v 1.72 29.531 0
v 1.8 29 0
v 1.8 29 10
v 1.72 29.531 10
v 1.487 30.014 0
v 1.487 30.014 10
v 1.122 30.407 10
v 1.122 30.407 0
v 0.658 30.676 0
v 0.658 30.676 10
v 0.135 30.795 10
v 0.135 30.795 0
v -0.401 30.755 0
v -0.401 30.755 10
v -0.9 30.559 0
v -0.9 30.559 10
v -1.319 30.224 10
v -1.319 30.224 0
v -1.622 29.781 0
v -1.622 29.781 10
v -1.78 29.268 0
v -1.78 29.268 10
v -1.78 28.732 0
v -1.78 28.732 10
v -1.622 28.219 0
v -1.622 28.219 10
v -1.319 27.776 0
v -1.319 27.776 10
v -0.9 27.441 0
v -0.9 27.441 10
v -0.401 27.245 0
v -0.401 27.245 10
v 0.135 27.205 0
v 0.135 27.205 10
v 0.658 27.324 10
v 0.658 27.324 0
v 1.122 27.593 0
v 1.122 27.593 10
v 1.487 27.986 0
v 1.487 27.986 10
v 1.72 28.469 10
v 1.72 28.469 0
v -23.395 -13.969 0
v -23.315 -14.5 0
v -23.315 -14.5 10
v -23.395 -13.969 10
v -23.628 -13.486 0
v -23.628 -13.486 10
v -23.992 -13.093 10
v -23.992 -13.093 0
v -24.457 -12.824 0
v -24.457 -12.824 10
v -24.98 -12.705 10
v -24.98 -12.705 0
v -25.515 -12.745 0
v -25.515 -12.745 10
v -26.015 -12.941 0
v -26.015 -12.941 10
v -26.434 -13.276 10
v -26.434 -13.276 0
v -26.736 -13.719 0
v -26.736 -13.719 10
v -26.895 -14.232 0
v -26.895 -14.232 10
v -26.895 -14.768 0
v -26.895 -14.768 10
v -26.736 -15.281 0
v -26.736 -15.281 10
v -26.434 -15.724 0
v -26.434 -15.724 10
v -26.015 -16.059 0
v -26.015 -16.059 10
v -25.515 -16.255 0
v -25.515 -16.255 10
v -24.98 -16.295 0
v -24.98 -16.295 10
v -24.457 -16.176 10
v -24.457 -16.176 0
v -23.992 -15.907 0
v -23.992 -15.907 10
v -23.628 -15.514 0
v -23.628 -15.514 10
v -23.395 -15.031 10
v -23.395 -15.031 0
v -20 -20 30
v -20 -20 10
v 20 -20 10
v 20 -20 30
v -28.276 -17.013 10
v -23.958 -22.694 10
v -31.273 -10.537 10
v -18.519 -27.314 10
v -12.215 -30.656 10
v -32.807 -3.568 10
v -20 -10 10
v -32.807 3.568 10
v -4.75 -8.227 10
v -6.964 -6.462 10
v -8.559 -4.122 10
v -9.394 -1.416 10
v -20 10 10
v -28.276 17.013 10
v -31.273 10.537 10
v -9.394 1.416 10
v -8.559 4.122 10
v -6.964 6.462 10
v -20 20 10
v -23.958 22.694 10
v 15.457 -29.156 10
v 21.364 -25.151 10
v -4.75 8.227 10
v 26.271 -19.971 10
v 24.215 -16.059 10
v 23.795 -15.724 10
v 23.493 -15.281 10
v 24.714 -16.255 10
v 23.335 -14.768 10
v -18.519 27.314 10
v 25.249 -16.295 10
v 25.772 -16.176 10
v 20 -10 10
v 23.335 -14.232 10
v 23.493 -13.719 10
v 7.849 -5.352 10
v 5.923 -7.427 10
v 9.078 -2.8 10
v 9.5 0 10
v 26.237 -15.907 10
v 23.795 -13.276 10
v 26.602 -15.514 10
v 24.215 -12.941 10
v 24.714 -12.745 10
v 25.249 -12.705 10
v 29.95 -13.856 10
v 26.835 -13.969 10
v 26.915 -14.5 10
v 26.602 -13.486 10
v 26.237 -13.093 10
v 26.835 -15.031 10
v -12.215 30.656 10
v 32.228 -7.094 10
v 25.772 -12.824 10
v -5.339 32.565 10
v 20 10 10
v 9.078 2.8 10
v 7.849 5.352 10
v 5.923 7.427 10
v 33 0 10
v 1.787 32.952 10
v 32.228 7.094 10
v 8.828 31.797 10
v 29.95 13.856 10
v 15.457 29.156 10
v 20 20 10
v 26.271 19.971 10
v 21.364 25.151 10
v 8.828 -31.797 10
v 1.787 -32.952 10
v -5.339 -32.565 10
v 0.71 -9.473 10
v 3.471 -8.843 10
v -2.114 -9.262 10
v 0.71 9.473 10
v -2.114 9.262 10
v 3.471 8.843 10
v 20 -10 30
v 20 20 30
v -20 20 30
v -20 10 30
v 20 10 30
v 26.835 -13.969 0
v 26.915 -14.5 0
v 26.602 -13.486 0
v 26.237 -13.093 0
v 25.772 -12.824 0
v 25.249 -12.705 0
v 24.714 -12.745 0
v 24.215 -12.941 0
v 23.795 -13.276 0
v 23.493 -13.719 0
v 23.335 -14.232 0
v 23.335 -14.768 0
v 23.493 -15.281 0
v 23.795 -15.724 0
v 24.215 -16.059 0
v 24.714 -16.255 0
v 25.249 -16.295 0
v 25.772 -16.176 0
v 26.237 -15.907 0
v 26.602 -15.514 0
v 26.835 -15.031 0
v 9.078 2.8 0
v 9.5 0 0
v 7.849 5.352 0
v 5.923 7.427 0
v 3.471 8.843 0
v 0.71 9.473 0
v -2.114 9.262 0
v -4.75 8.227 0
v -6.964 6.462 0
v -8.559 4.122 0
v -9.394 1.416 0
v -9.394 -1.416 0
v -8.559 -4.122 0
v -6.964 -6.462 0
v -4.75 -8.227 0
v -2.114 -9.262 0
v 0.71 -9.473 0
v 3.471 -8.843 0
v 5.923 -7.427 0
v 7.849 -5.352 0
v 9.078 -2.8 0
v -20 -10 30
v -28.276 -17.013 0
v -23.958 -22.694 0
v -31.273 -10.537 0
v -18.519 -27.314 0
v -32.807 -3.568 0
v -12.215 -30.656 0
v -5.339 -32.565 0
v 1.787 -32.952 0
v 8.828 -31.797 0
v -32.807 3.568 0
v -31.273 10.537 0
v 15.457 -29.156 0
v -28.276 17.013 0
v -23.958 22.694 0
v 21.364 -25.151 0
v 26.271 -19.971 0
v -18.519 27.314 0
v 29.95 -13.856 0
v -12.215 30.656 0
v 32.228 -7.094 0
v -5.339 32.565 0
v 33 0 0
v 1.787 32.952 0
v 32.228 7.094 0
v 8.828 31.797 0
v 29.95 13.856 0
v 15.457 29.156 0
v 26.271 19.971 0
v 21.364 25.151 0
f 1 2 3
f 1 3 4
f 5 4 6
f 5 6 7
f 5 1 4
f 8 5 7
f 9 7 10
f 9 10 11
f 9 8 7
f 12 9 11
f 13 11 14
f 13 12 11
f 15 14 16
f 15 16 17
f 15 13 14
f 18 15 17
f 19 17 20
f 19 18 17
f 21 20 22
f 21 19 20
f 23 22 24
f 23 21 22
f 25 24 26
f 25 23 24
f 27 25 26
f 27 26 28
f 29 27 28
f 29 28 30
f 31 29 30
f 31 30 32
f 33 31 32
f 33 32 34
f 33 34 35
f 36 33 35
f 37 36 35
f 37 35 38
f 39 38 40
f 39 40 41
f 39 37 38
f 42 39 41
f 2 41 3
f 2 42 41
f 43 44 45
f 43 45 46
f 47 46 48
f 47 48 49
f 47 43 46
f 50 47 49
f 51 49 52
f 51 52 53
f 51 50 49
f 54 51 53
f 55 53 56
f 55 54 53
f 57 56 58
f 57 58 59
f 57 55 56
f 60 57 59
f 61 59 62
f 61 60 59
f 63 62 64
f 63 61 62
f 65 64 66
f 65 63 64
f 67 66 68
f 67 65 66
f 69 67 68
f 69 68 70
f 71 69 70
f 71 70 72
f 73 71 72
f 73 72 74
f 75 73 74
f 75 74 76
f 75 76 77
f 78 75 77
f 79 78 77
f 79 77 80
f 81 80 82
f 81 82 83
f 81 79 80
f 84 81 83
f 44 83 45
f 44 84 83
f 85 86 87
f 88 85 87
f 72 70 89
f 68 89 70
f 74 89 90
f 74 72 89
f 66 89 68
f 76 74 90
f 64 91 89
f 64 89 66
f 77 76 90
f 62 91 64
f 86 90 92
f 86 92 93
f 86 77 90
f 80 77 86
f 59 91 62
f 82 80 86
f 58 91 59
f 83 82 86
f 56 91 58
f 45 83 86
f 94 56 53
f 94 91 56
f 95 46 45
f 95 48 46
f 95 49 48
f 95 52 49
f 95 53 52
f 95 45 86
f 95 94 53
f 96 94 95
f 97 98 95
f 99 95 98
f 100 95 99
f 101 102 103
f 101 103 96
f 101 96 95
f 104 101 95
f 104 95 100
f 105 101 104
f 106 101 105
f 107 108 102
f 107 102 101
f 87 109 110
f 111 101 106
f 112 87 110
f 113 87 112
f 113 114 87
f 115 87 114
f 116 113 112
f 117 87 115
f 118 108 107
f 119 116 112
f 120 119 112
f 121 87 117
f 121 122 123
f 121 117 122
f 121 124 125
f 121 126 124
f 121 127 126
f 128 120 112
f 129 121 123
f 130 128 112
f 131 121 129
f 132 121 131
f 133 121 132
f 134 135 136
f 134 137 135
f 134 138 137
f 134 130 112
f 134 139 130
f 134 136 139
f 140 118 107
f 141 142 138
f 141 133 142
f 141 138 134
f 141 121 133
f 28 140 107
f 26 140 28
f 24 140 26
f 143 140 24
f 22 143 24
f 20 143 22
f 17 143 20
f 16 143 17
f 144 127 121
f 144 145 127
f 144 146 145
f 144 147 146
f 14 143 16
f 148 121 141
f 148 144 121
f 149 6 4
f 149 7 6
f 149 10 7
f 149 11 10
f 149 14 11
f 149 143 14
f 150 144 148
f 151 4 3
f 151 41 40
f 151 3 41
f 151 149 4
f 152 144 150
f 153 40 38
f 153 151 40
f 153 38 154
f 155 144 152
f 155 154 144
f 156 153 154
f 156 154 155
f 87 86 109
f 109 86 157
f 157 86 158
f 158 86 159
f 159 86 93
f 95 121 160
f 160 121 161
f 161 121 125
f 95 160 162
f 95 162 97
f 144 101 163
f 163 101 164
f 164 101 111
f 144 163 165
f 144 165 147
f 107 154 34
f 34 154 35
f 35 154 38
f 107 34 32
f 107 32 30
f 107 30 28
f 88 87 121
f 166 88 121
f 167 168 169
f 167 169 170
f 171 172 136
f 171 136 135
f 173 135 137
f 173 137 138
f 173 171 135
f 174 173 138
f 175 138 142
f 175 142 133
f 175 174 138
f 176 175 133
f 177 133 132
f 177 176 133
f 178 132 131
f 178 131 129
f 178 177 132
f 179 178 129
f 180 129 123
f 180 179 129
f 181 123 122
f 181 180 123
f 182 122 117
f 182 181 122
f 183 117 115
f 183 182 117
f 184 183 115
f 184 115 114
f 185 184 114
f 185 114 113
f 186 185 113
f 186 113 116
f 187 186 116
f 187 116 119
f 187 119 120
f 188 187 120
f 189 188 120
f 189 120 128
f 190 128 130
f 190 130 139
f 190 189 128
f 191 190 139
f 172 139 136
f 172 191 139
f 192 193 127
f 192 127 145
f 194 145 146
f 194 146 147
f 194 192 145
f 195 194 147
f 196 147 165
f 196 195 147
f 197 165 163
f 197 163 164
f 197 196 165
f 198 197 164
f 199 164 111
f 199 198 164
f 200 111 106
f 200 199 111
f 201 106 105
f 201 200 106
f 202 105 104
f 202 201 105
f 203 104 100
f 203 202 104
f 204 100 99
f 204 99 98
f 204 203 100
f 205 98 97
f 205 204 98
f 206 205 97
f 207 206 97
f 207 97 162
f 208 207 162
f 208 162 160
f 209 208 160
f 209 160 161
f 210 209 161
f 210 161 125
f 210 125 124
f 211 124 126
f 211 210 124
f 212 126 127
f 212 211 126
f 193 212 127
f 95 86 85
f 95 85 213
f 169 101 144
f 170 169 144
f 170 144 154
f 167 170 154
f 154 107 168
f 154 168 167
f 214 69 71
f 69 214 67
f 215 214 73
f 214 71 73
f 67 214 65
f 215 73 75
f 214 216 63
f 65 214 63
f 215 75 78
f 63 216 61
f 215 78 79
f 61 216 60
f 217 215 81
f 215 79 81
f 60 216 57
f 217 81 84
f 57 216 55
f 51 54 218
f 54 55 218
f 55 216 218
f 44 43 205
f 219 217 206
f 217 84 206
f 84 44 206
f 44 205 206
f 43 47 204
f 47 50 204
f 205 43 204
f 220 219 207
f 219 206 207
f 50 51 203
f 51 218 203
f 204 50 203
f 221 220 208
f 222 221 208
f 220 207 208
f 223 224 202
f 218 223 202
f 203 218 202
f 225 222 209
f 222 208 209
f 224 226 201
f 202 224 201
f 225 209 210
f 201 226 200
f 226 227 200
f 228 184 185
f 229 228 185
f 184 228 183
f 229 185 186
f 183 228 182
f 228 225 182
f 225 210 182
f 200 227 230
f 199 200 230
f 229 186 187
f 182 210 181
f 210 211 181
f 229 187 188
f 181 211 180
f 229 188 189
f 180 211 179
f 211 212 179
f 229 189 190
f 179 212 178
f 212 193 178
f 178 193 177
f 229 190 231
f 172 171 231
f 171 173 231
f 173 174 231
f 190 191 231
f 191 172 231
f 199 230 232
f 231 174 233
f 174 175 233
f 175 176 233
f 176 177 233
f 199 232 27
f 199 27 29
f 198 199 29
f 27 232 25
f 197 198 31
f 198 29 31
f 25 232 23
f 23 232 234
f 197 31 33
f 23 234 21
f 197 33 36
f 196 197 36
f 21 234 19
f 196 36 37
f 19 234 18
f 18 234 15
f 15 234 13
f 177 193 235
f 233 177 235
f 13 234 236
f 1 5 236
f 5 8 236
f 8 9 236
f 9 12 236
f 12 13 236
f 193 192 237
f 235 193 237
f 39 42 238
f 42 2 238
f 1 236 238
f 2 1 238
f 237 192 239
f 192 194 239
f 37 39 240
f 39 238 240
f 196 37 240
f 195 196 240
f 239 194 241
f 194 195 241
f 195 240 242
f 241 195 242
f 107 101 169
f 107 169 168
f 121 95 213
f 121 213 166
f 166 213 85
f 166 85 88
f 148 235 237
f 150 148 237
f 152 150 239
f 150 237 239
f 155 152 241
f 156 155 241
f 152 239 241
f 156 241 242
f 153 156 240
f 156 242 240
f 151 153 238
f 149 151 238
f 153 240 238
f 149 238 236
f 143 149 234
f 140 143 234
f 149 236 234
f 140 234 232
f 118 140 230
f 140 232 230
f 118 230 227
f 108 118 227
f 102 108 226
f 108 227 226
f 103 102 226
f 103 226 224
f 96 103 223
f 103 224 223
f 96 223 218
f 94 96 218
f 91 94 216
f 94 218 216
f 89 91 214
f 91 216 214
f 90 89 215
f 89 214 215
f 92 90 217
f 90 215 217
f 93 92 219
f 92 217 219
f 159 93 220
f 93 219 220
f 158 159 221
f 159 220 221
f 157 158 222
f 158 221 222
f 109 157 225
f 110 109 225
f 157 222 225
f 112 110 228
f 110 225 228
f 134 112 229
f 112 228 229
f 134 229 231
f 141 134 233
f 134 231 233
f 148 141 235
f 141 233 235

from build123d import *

# Parameters (mm, degrees)
SKETCH_1_R      = 33
SKETCH_1_R_2    = 1.8
SKETCH_1_R_3    = 9.5
EXTRUDE_1_DEPTH = 10
SKETCH_2_W      = 40
SKETCH_2_H      = 10
EXTRUDE_2_DEPTH = 20


with BuildPart() as part:
    # 草图1 → 凸台-拉伸1 (new body)
    with BuildSketch(Plane.XY):
        Circle(SKETCH_1_R)
        with Locations((0, 29)):
            Circle(SKETCH_1_R_2, mode=Mode.SUBTRACT)
        with Locations((25.11473671, -14.5)):
            Circle(SKETCH_1_R_2, mode=Mode.SUBTRACT)
        with Locations((-25.11473671, -14.5)):
            Circle(SKETCH_1_R_2, mode=Mode.SUBTRACT)
        Circle(SKETCH_1_R_3, mode=Mode.SUBTRACT)
    extrude(amount=EXTRUDE_1_DEPTH)

    # 草图2 → 凸台-拉伸2 (add)
    with BuildSketch(Plane.XY.offset(10)):
        with Locations((0, 15)):
            Rectangle(SKETCH_2_W, SKETCH_2_H)
        with Locations((0, -15)):
            Rectangle(SKETCH_2_W, SKETCH_2_H)
    extrude(amount=EXTRUDE_2_DEPTH)


solid = part.part
